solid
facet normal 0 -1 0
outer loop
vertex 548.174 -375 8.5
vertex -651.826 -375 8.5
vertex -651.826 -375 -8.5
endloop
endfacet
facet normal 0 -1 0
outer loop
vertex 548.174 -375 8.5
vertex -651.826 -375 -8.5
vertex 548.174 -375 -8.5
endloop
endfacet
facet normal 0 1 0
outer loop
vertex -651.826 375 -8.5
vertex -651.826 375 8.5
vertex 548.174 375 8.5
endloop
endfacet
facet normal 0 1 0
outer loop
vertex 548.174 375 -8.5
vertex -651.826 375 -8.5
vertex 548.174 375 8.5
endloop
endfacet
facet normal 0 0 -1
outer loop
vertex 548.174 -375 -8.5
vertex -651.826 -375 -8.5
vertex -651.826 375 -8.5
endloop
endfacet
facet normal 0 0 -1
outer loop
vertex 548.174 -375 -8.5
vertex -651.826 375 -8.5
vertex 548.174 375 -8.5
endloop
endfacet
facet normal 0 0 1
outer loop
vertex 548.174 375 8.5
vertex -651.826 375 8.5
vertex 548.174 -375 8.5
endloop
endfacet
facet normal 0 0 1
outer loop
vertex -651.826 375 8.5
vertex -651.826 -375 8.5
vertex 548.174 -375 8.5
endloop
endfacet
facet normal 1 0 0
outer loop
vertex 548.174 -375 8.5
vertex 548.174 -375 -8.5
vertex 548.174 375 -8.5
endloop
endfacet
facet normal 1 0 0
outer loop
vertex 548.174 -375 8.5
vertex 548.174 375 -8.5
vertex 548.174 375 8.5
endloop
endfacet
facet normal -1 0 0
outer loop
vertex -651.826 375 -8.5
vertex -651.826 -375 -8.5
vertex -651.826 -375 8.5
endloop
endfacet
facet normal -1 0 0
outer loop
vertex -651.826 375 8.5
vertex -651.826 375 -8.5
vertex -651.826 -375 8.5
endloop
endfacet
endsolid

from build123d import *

# Parameters (mm, degrees)
F0_W     = 1200
F0_H     = 17
F1_DEPTH = 375
F2_W     = 45
F2_H     = 90
F3_DEPTH = 848
F5_W     = 45
F5_H     = 90
F6_DEPTH = 1800


with BuildPart() as f1:
    # F0 (on Front) → F1 (new body, symmetric)
    with BuildSketch(Plane.XZ):
        with Locations((-51.825875, 0)):
            Rectangle(F0_W, F0_H)
    extrude(amount=F1_DEPTH, both=True)


with BuildPart() as f3:
    # F2 (on Right) → F3 (new body, symmetric)
    with BuildSketch(Plane.YZ):
        with Locations((-351.989888, -54.616934)):
            Rectangle(F2_W, F2_H)
    extrude(amount=F3_DEPTH, both=True)


with BuildPart() as f6:
    # F5 (on face) → F6 (new body)
    with BuildSketch(Plane.YZ.offset(548.174125)):
        with Locations((-352.5, -53.6)):
            Rectangle(F5_W, F5_H)
    extrude(amount=-F6_DEPTH)


solid = f1.part
